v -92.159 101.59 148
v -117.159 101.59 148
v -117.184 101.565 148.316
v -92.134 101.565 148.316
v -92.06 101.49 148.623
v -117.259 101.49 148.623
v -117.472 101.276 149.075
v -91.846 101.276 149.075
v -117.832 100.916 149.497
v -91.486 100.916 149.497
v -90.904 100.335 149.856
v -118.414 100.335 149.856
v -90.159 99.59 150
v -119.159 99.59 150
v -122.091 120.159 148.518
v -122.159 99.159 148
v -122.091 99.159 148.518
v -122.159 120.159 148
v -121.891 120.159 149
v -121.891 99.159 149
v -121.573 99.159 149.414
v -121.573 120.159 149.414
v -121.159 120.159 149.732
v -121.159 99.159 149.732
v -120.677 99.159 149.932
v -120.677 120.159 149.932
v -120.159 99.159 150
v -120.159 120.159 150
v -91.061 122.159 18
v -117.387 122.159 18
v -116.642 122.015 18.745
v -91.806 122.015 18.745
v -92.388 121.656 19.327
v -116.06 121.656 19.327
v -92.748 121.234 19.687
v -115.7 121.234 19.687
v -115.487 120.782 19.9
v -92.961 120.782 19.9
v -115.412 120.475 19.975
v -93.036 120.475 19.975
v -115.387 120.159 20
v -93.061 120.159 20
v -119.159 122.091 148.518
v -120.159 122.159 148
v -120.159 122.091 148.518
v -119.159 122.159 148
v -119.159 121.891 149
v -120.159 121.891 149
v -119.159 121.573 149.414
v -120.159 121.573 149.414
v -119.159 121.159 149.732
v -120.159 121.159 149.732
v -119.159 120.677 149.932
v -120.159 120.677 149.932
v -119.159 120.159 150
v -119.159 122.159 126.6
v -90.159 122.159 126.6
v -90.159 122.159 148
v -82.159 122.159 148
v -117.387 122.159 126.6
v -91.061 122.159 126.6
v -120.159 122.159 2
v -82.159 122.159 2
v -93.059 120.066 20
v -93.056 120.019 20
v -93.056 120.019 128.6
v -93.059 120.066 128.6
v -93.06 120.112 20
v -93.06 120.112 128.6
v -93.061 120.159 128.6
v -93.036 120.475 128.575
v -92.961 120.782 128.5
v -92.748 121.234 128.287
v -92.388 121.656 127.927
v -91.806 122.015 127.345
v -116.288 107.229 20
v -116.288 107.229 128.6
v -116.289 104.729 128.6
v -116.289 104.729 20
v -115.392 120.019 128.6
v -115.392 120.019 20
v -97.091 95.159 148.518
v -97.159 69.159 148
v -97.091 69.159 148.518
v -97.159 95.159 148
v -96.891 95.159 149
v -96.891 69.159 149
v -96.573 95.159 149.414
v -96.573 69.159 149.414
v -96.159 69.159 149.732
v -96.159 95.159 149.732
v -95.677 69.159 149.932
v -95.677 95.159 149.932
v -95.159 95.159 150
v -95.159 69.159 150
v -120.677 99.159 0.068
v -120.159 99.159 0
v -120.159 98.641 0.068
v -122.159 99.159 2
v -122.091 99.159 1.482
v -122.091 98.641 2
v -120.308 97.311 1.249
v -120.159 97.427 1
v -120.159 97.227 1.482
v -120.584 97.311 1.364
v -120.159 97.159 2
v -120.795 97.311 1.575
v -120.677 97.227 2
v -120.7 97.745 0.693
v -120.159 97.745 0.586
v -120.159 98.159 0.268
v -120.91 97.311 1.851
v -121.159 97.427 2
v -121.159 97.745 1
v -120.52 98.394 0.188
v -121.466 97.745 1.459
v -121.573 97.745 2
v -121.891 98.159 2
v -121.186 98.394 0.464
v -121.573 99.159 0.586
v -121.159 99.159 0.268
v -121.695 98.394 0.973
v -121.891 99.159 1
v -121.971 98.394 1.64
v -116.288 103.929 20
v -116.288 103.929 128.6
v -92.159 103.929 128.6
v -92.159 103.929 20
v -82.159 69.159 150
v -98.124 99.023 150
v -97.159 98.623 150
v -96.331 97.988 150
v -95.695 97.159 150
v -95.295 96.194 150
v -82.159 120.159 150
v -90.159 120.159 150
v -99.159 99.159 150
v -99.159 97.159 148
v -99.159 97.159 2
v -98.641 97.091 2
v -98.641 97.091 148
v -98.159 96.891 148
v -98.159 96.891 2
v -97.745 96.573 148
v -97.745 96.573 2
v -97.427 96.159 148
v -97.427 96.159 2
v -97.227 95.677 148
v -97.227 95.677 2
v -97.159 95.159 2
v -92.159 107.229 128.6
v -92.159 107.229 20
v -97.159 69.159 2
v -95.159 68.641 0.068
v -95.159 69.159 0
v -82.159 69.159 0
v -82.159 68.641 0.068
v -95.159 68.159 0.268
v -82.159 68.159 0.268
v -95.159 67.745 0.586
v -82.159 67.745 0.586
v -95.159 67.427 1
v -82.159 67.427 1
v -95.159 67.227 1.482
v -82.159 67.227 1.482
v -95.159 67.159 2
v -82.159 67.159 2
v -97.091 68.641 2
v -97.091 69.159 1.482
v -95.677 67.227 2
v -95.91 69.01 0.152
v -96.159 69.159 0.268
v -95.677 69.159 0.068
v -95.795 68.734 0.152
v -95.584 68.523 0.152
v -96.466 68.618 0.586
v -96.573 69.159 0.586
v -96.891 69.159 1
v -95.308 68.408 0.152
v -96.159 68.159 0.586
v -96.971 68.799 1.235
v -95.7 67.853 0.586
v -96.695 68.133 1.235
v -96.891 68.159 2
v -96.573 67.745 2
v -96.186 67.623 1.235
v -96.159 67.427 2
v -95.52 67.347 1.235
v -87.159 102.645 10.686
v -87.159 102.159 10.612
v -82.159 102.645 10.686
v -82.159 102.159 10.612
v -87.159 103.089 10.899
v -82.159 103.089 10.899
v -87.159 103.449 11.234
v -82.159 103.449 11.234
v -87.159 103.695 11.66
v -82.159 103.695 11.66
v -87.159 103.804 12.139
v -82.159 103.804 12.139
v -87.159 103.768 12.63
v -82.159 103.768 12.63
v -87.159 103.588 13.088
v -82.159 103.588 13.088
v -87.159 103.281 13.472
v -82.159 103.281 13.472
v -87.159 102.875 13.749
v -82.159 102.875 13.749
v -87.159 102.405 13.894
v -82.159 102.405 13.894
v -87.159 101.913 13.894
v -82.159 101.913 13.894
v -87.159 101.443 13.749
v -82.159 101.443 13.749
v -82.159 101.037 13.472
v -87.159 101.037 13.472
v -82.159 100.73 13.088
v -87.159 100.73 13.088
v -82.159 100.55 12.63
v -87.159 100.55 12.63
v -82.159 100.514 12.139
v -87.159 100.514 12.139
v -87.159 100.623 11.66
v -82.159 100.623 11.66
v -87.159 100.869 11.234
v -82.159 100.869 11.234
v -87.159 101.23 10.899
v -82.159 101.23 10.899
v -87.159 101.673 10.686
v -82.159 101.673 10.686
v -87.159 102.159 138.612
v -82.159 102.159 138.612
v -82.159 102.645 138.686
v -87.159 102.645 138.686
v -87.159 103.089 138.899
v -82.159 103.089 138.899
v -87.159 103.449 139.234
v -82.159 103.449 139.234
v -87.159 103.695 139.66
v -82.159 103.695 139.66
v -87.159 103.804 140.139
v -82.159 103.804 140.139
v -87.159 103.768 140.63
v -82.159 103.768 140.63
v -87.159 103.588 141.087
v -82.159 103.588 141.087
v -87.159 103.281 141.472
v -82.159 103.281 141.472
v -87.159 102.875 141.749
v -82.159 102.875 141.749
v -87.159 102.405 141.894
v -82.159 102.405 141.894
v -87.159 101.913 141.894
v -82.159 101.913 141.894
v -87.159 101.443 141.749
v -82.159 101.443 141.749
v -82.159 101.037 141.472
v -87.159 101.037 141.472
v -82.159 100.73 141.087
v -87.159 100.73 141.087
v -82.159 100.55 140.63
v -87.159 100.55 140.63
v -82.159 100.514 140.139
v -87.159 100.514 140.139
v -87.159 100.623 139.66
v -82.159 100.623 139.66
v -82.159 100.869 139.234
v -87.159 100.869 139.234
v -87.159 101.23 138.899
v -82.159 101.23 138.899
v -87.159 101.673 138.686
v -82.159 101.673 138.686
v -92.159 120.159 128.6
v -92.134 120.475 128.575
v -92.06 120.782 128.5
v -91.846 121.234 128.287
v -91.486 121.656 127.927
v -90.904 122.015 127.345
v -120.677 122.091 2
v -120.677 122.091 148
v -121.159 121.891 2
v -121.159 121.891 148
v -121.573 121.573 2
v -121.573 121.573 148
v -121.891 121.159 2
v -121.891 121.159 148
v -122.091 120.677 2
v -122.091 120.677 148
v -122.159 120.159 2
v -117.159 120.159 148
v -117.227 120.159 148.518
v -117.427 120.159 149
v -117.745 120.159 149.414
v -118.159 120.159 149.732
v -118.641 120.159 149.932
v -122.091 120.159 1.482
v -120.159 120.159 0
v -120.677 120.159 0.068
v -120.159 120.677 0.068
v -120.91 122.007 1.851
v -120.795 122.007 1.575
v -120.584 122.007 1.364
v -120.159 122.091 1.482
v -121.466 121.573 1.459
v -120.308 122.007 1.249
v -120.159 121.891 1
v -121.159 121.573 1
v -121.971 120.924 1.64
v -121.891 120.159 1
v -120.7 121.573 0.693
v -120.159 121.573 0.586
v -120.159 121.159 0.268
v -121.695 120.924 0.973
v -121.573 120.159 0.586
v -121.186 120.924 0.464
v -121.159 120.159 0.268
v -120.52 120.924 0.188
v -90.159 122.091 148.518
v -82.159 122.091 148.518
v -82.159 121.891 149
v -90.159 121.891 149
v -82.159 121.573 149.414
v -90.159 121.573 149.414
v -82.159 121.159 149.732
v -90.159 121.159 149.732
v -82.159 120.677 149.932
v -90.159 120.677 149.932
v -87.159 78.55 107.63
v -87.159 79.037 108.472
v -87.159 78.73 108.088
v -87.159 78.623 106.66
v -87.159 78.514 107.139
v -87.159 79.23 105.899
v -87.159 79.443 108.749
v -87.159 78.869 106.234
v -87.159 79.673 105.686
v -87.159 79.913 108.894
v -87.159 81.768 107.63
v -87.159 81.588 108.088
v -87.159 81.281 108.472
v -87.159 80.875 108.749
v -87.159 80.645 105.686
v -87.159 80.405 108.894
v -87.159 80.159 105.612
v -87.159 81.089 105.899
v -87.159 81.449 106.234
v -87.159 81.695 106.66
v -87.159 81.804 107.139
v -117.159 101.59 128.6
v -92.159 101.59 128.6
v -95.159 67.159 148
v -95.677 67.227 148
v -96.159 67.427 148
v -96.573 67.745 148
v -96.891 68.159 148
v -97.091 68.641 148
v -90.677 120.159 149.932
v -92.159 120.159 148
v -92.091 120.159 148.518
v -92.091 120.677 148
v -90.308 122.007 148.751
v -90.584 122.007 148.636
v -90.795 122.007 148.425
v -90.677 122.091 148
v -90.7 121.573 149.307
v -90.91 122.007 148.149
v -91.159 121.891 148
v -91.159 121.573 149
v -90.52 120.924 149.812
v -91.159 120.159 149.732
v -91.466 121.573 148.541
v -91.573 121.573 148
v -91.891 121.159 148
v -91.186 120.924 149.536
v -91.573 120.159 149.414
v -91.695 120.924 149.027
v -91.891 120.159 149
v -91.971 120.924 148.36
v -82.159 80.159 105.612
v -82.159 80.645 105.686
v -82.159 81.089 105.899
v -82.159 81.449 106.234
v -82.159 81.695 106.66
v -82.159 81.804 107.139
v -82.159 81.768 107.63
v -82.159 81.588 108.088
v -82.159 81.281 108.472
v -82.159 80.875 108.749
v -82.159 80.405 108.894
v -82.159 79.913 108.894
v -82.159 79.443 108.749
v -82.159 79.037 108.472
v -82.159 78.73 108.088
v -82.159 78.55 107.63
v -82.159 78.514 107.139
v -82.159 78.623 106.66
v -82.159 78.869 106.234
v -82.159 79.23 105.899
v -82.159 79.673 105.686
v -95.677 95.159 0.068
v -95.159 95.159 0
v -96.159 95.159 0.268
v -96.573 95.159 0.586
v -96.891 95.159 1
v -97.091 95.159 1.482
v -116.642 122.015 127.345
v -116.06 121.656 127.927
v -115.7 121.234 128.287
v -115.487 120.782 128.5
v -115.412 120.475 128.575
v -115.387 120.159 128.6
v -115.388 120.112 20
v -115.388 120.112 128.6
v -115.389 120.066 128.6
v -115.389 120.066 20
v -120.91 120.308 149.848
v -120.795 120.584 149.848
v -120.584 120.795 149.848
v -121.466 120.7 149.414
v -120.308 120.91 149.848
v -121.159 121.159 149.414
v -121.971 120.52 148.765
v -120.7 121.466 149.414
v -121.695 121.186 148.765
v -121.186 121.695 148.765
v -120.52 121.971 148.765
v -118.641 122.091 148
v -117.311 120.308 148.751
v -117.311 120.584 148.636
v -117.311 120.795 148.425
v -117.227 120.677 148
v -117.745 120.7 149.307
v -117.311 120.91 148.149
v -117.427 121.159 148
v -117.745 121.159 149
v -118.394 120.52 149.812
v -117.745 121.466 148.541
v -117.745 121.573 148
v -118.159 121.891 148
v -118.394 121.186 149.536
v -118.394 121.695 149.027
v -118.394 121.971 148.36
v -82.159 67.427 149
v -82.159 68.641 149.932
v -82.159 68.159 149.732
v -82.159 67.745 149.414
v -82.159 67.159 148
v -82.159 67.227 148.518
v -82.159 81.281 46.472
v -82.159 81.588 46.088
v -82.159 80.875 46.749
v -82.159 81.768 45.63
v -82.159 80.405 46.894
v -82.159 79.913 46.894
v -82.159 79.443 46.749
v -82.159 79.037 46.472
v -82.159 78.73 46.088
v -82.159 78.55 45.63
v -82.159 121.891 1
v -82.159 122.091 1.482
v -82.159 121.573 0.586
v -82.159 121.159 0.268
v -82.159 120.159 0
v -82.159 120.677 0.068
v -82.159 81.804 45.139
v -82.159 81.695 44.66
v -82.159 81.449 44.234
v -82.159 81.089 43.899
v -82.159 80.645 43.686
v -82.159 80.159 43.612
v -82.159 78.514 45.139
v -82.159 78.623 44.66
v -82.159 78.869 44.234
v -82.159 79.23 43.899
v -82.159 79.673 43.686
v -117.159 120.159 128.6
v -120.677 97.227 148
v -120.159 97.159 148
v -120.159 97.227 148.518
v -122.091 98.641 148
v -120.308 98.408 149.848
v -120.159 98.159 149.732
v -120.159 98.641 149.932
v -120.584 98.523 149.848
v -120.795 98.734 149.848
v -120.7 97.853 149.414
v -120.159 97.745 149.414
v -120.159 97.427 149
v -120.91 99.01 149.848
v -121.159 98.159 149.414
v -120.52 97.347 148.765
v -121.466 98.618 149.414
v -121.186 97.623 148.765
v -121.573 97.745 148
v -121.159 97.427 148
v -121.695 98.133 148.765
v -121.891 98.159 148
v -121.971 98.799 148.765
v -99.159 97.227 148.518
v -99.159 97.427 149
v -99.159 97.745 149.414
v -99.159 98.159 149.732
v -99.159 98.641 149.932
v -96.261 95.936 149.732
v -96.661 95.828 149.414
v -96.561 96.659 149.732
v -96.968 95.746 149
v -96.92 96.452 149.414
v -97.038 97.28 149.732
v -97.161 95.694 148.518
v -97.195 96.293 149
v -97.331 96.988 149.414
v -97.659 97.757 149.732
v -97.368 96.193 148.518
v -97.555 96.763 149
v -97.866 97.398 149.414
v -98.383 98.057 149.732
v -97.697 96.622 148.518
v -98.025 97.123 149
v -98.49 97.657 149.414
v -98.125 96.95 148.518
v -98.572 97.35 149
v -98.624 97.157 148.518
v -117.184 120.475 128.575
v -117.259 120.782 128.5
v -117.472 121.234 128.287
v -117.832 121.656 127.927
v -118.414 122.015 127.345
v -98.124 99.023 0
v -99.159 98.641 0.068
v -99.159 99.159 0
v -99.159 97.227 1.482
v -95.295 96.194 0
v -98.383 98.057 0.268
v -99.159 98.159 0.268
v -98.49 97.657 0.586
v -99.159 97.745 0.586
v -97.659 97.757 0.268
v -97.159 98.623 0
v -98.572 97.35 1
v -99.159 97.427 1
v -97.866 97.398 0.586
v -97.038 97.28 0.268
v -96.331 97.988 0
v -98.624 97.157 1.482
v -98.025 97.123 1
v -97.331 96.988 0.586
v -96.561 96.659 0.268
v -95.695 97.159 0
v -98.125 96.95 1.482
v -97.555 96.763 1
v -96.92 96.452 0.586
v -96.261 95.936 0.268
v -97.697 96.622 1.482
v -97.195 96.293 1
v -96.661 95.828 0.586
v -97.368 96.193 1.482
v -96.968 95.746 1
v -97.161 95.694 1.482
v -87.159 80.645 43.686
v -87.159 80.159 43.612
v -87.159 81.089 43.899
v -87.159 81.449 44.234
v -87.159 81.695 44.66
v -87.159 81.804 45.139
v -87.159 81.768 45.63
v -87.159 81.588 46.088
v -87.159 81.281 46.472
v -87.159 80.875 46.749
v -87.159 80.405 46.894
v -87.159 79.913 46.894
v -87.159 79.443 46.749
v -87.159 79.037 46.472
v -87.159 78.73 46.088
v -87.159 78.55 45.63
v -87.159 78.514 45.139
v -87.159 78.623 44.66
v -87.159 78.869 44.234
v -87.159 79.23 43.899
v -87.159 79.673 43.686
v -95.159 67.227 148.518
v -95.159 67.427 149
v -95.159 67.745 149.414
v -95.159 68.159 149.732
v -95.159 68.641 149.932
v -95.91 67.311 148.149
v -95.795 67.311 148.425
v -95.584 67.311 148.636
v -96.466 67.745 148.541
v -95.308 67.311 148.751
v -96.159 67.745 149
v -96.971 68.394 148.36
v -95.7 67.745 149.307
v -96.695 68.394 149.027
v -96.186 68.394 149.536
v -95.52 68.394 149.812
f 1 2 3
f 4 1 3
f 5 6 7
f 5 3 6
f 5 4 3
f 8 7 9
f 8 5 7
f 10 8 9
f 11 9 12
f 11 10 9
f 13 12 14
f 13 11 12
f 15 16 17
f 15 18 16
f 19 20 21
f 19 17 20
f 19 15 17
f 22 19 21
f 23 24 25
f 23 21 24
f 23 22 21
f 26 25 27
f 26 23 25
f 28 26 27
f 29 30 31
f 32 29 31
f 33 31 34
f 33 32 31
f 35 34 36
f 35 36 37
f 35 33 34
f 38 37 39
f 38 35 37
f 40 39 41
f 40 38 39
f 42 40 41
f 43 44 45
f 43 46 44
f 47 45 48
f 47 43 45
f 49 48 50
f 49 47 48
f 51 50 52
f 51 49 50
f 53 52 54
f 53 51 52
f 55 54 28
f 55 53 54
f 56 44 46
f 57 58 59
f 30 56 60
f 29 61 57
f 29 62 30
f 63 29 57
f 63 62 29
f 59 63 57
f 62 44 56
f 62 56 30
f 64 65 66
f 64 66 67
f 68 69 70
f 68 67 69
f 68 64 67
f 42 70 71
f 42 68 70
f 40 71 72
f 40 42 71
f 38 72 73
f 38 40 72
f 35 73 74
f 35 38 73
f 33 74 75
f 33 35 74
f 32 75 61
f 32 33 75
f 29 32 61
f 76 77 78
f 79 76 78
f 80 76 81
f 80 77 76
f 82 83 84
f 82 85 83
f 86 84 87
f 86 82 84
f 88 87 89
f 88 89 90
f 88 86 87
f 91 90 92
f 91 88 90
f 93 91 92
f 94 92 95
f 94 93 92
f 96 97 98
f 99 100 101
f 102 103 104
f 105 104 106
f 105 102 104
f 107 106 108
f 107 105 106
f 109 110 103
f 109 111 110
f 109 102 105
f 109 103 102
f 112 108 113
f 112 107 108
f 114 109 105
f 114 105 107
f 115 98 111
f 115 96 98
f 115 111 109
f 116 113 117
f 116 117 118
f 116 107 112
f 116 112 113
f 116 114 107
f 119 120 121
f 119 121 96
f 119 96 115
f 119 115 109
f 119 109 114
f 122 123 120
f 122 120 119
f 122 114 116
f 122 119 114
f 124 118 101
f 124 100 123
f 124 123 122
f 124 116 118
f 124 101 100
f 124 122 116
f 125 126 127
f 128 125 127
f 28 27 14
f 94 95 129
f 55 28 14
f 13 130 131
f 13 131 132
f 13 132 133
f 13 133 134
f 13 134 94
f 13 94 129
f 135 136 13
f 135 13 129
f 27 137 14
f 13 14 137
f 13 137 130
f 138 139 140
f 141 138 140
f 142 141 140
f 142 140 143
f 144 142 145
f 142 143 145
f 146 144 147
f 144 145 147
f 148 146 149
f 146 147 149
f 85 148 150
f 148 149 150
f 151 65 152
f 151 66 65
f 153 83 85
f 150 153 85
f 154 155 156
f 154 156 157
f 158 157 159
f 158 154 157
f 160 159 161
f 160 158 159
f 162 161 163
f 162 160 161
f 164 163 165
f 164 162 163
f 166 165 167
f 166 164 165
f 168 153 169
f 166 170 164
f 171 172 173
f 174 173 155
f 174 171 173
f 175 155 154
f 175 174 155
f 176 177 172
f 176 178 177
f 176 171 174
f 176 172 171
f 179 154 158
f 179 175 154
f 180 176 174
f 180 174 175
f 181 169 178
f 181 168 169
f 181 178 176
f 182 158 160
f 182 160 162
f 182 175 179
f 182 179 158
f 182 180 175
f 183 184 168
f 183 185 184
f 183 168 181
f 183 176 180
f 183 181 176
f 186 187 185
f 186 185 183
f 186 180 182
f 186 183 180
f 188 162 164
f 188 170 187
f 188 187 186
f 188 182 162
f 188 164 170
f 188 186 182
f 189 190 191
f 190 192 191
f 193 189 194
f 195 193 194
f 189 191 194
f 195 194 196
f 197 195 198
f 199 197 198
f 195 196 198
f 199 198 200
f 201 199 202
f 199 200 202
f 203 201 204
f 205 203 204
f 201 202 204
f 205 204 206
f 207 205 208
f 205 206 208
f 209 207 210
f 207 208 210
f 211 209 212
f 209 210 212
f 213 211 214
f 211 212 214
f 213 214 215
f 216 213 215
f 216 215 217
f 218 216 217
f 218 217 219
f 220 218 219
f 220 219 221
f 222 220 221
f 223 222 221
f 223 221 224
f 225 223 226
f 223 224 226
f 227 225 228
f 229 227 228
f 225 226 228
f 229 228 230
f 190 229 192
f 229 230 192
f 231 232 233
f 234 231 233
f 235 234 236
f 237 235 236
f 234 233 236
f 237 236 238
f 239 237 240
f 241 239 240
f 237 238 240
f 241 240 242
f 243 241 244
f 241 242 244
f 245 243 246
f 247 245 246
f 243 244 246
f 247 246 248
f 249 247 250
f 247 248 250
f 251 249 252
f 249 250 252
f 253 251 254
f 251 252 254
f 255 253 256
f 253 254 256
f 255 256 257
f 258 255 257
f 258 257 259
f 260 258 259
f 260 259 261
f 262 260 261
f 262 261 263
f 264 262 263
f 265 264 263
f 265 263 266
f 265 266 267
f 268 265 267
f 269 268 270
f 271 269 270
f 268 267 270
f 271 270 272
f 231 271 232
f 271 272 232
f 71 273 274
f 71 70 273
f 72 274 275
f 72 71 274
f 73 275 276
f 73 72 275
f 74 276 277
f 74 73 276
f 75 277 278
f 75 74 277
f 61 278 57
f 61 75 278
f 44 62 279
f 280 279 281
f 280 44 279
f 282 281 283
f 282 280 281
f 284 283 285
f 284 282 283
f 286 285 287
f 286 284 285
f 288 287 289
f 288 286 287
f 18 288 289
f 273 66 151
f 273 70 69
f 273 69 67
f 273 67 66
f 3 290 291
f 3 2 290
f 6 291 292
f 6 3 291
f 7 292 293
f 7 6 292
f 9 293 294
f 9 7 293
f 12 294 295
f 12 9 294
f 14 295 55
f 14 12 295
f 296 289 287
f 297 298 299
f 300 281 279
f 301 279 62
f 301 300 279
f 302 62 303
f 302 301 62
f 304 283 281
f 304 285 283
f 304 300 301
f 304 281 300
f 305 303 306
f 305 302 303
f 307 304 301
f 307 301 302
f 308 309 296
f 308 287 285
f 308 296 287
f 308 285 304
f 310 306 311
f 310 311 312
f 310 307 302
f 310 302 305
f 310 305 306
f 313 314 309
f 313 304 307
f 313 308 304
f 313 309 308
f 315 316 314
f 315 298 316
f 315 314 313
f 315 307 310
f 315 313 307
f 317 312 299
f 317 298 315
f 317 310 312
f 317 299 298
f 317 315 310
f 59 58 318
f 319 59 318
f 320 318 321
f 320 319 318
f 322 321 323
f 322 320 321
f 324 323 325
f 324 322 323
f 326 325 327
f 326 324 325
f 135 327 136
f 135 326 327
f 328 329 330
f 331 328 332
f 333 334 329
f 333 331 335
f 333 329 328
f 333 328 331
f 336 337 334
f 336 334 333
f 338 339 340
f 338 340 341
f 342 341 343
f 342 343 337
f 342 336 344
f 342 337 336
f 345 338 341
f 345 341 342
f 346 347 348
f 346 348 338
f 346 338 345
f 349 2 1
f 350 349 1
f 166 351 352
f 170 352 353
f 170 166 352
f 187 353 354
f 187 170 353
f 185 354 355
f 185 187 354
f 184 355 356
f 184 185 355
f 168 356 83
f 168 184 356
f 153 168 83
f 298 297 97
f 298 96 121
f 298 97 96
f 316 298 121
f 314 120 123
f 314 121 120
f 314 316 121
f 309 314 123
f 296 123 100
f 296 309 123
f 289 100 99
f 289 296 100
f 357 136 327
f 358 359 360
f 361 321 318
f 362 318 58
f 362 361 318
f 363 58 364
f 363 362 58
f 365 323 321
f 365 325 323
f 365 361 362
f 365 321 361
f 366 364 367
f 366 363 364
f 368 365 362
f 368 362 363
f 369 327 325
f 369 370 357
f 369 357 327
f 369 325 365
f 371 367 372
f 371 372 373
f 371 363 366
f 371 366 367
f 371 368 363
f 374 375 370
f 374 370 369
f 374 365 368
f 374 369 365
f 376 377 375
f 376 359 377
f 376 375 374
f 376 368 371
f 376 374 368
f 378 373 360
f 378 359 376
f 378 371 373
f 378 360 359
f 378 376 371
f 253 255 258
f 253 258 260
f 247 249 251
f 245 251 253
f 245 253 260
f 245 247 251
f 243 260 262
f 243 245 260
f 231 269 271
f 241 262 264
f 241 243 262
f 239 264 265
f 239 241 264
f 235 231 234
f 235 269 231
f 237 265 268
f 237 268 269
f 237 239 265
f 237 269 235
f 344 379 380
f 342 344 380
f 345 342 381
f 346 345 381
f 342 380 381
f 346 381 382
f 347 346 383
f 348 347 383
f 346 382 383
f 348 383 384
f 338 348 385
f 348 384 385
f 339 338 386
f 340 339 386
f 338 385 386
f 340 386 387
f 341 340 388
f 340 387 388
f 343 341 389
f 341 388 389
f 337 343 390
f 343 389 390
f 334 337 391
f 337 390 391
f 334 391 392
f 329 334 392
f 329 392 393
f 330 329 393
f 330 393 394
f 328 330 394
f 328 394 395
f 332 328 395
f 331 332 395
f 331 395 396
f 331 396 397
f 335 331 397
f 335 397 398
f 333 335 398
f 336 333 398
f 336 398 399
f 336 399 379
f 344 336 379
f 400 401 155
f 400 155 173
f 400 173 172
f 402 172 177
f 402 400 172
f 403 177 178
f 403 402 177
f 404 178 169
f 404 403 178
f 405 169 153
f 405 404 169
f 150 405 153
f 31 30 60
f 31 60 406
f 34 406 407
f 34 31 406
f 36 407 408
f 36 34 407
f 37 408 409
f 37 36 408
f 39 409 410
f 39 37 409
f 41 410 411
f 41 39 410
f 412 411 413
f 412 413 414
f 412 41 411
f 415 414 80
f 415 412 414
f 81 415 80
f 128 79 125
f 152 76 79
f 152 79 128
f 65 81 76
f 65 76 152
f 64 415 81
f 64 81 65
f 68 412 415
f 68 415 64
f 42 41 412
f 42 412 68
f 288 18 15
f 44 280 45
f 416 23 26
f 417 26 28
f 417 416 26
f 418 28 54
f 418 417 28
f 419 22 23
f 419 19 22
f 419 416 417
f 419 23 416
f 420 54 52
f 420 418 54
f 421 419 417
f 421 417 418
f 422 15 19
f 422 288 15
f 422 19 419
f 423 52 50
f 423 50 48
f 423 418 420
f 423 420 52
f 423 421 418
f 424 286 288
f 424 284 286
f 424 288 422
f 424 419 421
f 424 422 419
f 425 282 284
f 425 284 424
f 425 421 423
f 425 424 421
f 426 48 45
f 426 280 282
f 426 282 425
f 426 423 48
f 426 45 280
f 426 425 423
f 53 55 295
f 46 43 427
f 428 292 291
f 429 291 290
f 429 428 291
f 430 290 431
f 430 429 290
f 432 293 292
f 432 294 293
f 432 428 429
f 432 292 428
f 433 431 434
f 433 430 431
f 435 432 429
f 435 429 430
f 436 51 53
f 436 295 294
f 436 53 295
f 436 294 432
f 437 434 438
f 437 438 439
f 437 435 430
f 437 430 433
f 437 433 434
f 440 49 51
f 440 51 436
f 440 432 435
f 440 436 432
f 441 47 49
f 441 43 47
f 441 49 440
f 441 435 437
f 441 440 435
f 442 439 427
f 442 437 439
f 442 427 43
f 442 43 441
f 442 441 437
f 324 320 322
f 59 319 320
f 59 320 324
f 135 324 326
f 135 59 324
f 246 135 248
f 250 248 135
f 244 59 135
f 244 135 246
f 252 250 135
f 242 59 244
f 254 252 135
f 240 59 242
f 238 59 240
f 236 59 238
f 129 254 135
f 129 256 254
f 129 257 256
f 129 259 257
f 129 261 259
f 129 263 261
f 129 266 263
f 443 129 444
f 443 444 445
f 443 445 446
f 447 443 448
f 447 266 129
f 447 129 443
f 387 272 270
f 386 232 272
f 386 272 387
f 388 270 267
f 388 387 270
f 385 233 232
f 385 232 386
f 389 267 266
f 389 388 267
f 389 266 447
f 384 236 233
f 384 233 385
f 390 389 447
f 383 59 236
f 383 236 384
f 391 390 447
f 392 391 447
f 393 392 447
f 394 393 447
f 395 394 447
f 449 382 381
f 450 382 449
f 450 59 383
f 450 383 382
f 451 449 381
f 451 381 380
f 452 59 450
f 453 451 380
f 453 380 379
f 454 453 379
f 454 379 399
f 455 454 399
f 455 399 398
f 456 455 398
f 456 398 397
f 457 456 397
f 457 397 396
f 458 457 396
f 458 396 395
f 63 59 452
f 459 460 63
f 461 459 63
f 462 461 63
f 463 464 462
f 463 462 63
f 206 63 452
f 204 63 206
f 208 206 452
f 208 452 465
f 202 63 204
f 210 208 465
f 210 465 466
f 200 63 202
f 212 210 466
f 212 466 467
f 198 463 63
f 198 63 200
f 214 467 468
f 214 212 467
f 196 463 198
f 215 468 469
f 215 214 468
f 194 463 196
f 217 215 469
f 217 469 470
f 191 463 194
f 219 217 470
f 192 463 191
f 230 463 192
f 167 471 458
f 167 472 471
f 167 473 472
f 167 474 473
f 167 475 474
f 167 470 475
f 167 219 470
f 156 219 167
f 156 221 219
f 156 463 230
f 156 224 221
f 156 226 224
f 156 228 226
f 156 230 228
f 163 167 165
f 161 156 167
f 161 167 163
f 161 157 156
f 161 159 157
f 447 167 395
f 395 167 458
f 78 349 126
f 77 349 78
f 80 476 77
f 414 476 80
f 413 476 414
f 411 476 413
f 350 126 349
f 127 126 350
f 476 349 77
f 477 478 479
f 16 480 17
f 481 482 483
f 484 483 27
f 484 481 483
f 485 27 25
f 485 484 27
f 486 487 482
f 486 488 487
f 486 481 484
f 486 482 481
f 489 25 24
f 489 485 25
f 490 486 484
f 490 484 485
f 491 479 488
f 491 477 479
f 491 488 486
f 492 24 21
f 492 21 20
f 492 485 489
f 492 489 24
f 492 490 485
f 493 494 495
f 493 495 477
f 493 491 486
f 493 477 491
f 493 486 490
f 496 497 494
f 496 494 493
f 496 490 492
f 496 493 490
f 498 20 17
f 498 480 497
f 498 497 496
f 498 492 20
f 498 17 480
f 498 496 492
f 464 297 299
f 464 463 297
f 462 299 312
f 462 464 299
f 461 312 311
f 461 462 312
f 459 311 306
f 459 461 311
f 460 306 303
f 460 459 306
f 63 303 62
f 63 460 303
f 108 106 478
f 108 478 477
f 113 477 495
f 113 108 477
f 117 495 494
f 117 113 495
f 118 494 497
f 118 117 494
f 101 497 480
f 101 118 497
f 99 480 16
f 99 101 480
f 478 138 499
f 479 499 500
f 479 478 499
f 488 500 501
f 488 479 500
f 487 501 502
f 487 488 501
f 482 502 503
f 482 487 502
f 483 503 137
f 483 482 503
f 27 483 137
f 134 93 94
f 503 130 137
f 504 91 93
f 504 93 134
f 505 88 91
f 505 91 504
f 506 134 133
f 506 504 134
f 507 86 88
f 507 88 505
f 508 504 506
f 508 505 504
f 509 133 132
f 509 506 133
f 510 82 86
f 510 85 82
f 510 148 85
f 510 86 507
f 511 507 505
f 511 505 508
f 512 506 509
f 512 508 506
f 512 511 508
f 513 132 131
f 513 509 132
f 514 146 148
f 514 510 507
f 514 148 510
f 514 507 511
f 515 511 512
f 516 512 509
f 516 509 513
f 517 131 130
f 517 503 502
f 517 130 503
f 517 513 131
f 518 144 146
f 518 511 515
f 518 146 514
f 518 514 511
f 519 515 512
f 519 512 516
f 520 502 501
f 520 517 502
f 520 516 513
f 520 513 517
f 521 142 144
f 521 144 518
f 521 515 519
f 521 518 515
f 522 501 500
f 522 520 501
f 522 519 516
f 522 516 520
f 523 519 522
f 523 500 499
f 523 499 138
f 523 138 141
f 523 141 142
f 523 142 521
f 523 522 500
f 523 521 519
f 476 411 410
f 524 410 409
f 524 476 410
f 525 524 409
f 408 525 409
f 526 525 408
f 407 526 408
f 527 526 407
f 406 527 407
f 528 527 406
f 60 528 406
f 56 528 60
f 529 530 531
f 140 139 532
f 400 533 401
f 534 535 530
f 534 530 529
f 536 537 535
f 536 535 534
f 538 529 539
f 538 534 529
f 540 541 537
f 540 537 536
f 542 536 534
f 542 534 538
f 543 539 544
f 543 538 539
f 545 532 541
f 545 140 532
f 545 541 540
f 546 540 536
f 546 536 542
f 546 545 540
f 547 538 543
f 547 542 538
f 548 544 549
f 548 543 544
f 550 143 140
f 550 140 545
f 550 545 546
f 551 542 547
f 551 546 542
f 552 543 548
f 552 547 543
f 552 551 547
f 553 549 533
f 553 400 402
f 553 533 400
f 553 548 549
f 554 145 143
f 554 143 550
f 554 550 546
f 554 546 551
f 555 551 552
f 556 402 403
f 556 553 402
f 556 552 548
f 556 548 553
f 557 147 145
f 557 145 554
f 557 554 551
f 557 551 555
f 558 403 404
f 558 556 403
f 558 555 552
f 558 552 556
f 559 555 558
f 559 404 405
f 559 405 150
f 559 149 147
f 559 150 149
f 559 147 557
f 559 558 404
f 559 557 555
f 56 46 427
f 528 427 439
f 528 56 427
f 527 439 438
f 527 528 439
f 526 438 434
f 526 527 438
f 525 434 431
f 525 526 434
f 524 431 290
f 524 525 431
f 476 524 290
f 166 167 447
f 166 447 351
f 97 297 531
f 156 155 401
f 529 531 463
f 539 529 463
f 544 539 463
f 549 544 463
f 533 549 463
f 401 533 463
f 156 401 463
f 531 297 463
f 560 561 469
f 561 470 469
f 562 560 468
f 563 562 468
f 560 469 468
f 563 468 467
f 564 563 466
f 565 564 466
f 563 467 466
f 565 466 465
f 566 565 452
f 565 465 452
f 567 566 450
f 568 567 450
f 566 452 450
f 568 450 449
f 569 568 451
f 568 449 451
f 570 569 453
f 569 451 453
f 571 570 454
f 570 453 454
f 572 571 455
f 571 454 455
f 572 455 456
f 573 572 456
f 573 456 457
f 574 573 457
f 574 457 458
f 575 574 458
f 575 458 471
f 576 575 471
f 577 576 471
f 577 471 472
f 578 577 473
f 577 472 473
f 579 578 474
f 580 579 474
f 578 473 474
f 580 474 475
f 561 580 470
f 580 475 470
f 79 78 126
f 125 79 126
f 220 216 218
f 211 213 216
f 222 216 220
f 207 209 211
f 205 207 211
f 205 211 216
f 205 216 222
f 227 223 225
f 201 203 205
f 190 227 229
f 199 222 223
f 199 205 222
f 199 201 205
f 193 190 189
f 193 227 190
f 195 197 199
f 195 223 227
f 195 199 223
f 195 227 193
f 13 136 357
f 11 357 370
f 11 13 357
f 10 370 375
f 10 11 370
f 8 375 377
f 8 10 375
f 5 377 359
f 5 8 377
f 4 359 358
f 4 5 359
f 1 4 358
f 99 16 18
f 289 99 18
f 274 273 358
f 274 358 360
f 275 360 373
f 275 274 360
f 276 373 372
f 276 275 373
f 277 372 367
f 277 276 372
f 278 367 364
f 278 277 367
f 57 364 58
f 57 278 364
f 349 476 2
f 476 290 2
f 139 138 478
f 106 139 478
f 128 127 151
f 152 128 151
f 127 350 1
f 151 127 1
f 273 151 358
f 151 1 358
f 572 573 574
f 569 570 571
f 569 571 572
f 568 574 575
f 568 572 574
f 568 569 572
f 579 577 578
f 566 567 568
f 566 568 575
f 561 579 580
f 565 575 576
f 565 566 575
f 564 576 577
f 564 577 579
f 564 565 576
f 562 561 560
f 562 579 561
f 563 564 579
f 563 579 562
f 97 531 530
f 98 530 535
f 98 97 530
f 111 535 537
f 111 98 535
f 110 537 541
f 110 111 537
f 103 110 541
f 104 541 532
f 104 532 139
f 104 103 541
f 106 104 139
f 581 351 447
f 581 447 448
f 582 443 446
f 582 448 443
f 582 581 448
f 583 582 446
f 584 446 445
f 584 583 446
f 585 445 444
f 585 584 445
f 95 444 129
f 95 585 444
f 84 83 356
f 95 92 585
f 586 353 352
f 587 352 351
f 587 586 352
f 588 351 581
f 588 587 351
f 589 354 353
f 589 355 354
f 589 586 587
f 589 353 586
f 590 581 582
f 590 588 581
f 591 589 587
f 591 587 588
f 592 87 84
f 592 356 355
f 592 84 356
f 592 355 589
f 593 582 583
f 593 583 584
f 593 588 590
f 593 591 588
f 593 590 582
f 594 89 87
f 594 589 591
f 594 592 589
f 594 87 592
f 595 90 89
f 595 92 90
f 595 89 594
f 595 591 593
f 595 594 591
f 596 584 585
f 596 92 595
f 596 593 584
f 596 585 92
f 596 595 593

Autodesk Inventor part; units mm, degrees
ref_plane "YZ Plane" through (0, 0, 0) normal (1, 0, 0) x (0, 1, 0)
ref_plane "XZ Plane" through (0, 0, 0) normal (0, 1, 0) x (-1, 0, 0)
ref_plane "XY Plane" through (0, 0, 0) normal (0, 0, 1) x (1, 0, 0)
sketch "スケッチ1" plane through (0, 0, 0) normal (0, 0, 1) x (1, 0, 0)
  line L0 (-122.1591, 122.1591) -> (-82.1591, 122.1591)
  line L1 (-82.1591, 122.1591) -> (-82.1591, 67.1591)
  line L2 (-82.1591, 67.1591) -> (-122.1591, 67.1591)
  line L3 (-122.1591, 67.1591) -> (-122.1591, 122.1591)
  point P0 (0, 0)
  dimension "d0" = 40
  dimension "d1" = 55
extrude "押し出し1" add sketch "スケッチ1" along normal blind 150
sketch "スケッチ4" plane through (0, 0, 150) normal (0, 0, 1) x (1, 0, 0)
  line L0 (-82.1591, 122.1591) -> (-122.1591, 122.1591) projected
  line L1 (-117.1591, 101.5897) -> (-92.1591, 101.5897)
  line L2 (-92.1591, 101.5897) -> (-92.1591, 122.1591)
  line L3 (-92.1591, 122.1591) -> (-117.1591, 122.1591)
  line L4 (-117.1591, 122.1591) -> (-117.1591, 101.5897)
  line L5 (-82.1591, 67.1591) -> (-82.1591, 122.1591) projected
  point P0 (0, 0)
  dimension "d4" = 10
  dimension "d5" = 25
extrude "押し出し2" cut sketch "スケッチ4" against normal blind 21.4
sketch "スケッチ5" plane through (0, 0, 150) normal (0, 0, 1) x (1, 0, 0)
  line L0 (-116.288, 107.2289) -> (-115.2421, 122.1591) projected
  line L1 (-93.2061, 122.1591) -> (-92.1591, 107.2289) projected
  line L2 (-95.5428, 103.9291) -> (-112.9179, 103.9291) projected
  line L3 (-115.2421, 122.1591) -> (-93.2061, 122.1591) projected
  line L4 (-112.2468, 103.9291) -> (-108.7036, 103.9291) projected
  line L5 (-95.5428, 103.9291) -> (-112.9179, 103.9291) projected
  line L6 (-92.1591, 104.7291) -> (-92.1591, 104.7291)
  line L7 (-116.2893, 104.7291) -> (-116.288, 103.9291)
  line L8 (-116.288, 103.9291) -> (-114.2025, 103.9291)
  line L9 (-92.1591, 104.7291) -> (-92.1591, 103.9291)
  line L10 (-95.5428, 103.9291) -> (-92.1591, 103.9291)
  line L11 (-114.2025, 103.9291) -> (-112.9179, 103.9291)
  line L12 (-116.2893, 104.7291) -> (-116.288, 103.9291)
  line L13 (-116.288, 103.9291) -> (-112.9179, 103.9291)
  line L14 (-92.1591, 104.7291) -> (-92.1591, 103.9291)
  line L15 (-95.5428, 103.9291) -> (-92.1591, 103.9291)
  line L16 (-92.1591, 103.9291) -> (-92.1591, 107.2289)
  line L17 (-92.1591, 103.9291) -> (-95.5428, 103.9291)
  line L18 (-95.5428, 103.9291) -> (-116.288, 103.9291)
  line L19 (-116.288, 103.9291) -> (-116.288, 104.7291)
  line L20 (-116.288, 107.2289) -> (-116.288, 104.7291)
  point P0 (0, 0)
extrude "押し出し3" cut sketch "スケッチ5" against normal blind 130
sketch "スケッチ6" plane through (0, 0, 150) normal (0, 0, 1) x (1, 0, 0)
  line L0 (-122.1591, 67.1591) -> (-82.1591, 67.1591) projected
  line L1 (-122.1591, 67.1591) -> (-97.1591, 67.1591)
  line L2 (-97.1591, 67.1591) -> (-97.1591, 97.1591)
  line L3 (-97.1591, 97.1591) -> (-122.1591, 97.1591)
  line L4 (-122.1591, 97.1591) -> (-122.1591, 67.1591)
  line L5 (-82.1591, 67.1591) -> (-82.1591, 122.1591) projected
  point P0 (0, 0)
  dimension "d10" = 30
  dimension "d11" = 15
extrude "押し出し4" cut sketch "スケッチ6" against normal blind 170
sketch "スケッチ7" plane through (-82.1591, 67.1591, 0) normal (1, 0, 0) x (0, 0, -1)
  circle A0 centre (-140.2625, 35) radius 1.65
  circle A1 centre (-107.2625, 13) radius 1.65
  circle A2 centre (-45.2625, 13) radius 1.65
  circle A3 centre (-12.2625, 35) radius 1.65
  point P0 (0, -67.1591)
  dimension "d14" = 3.3
  dimension "d15" = 3.3
  dimension "d16" = 3.3
  dimension "d17" = 3.3
extrude "押し出し5" cut sketch "スケッチ7" against normal blind 5
fillet "フィレット1" radius 2 26 edges at (-122.1591, 109.6591, 0) (-122.1591, 97.1591, 75) (-122.1591, 122.1591, 75) (-102.1591, 122.1591, 0) (-122.1591, 109.6591, 150) (-119.6591, 122.1591, 150) (-117.1591, 111.8744, 150) (-92.1591, 102.7594, 150) (-92.1591, 114.694, 150) (-87.1591, 122.1591, 150) (-92.1591, 122.1591, 139.3) (-104.6591, 101.5897, 150) (-109.6591, 97.1591, 150) (-97.1591, 82.1591, 150) (-97.1591, 67.1591, 75) (-89.6591, 67.1591, 150) (-97.1591, 82.1591, 0) (-89.6591, 67.1591, 0) (-97.1591, 97.1591, 75) (-109.6591, 97.1591, 0) (-104.2241, 122.1591, 20) (-117.1591, 122.1591, 139.3) (-116.2006, 122.1591, 128.6) (-92.6826, 122.1591, 128.6) (-115.2421, 122.1591, 74.3) (-93.2061, 122.1591, 74.3)
properties part number "structure_core_cradle"
